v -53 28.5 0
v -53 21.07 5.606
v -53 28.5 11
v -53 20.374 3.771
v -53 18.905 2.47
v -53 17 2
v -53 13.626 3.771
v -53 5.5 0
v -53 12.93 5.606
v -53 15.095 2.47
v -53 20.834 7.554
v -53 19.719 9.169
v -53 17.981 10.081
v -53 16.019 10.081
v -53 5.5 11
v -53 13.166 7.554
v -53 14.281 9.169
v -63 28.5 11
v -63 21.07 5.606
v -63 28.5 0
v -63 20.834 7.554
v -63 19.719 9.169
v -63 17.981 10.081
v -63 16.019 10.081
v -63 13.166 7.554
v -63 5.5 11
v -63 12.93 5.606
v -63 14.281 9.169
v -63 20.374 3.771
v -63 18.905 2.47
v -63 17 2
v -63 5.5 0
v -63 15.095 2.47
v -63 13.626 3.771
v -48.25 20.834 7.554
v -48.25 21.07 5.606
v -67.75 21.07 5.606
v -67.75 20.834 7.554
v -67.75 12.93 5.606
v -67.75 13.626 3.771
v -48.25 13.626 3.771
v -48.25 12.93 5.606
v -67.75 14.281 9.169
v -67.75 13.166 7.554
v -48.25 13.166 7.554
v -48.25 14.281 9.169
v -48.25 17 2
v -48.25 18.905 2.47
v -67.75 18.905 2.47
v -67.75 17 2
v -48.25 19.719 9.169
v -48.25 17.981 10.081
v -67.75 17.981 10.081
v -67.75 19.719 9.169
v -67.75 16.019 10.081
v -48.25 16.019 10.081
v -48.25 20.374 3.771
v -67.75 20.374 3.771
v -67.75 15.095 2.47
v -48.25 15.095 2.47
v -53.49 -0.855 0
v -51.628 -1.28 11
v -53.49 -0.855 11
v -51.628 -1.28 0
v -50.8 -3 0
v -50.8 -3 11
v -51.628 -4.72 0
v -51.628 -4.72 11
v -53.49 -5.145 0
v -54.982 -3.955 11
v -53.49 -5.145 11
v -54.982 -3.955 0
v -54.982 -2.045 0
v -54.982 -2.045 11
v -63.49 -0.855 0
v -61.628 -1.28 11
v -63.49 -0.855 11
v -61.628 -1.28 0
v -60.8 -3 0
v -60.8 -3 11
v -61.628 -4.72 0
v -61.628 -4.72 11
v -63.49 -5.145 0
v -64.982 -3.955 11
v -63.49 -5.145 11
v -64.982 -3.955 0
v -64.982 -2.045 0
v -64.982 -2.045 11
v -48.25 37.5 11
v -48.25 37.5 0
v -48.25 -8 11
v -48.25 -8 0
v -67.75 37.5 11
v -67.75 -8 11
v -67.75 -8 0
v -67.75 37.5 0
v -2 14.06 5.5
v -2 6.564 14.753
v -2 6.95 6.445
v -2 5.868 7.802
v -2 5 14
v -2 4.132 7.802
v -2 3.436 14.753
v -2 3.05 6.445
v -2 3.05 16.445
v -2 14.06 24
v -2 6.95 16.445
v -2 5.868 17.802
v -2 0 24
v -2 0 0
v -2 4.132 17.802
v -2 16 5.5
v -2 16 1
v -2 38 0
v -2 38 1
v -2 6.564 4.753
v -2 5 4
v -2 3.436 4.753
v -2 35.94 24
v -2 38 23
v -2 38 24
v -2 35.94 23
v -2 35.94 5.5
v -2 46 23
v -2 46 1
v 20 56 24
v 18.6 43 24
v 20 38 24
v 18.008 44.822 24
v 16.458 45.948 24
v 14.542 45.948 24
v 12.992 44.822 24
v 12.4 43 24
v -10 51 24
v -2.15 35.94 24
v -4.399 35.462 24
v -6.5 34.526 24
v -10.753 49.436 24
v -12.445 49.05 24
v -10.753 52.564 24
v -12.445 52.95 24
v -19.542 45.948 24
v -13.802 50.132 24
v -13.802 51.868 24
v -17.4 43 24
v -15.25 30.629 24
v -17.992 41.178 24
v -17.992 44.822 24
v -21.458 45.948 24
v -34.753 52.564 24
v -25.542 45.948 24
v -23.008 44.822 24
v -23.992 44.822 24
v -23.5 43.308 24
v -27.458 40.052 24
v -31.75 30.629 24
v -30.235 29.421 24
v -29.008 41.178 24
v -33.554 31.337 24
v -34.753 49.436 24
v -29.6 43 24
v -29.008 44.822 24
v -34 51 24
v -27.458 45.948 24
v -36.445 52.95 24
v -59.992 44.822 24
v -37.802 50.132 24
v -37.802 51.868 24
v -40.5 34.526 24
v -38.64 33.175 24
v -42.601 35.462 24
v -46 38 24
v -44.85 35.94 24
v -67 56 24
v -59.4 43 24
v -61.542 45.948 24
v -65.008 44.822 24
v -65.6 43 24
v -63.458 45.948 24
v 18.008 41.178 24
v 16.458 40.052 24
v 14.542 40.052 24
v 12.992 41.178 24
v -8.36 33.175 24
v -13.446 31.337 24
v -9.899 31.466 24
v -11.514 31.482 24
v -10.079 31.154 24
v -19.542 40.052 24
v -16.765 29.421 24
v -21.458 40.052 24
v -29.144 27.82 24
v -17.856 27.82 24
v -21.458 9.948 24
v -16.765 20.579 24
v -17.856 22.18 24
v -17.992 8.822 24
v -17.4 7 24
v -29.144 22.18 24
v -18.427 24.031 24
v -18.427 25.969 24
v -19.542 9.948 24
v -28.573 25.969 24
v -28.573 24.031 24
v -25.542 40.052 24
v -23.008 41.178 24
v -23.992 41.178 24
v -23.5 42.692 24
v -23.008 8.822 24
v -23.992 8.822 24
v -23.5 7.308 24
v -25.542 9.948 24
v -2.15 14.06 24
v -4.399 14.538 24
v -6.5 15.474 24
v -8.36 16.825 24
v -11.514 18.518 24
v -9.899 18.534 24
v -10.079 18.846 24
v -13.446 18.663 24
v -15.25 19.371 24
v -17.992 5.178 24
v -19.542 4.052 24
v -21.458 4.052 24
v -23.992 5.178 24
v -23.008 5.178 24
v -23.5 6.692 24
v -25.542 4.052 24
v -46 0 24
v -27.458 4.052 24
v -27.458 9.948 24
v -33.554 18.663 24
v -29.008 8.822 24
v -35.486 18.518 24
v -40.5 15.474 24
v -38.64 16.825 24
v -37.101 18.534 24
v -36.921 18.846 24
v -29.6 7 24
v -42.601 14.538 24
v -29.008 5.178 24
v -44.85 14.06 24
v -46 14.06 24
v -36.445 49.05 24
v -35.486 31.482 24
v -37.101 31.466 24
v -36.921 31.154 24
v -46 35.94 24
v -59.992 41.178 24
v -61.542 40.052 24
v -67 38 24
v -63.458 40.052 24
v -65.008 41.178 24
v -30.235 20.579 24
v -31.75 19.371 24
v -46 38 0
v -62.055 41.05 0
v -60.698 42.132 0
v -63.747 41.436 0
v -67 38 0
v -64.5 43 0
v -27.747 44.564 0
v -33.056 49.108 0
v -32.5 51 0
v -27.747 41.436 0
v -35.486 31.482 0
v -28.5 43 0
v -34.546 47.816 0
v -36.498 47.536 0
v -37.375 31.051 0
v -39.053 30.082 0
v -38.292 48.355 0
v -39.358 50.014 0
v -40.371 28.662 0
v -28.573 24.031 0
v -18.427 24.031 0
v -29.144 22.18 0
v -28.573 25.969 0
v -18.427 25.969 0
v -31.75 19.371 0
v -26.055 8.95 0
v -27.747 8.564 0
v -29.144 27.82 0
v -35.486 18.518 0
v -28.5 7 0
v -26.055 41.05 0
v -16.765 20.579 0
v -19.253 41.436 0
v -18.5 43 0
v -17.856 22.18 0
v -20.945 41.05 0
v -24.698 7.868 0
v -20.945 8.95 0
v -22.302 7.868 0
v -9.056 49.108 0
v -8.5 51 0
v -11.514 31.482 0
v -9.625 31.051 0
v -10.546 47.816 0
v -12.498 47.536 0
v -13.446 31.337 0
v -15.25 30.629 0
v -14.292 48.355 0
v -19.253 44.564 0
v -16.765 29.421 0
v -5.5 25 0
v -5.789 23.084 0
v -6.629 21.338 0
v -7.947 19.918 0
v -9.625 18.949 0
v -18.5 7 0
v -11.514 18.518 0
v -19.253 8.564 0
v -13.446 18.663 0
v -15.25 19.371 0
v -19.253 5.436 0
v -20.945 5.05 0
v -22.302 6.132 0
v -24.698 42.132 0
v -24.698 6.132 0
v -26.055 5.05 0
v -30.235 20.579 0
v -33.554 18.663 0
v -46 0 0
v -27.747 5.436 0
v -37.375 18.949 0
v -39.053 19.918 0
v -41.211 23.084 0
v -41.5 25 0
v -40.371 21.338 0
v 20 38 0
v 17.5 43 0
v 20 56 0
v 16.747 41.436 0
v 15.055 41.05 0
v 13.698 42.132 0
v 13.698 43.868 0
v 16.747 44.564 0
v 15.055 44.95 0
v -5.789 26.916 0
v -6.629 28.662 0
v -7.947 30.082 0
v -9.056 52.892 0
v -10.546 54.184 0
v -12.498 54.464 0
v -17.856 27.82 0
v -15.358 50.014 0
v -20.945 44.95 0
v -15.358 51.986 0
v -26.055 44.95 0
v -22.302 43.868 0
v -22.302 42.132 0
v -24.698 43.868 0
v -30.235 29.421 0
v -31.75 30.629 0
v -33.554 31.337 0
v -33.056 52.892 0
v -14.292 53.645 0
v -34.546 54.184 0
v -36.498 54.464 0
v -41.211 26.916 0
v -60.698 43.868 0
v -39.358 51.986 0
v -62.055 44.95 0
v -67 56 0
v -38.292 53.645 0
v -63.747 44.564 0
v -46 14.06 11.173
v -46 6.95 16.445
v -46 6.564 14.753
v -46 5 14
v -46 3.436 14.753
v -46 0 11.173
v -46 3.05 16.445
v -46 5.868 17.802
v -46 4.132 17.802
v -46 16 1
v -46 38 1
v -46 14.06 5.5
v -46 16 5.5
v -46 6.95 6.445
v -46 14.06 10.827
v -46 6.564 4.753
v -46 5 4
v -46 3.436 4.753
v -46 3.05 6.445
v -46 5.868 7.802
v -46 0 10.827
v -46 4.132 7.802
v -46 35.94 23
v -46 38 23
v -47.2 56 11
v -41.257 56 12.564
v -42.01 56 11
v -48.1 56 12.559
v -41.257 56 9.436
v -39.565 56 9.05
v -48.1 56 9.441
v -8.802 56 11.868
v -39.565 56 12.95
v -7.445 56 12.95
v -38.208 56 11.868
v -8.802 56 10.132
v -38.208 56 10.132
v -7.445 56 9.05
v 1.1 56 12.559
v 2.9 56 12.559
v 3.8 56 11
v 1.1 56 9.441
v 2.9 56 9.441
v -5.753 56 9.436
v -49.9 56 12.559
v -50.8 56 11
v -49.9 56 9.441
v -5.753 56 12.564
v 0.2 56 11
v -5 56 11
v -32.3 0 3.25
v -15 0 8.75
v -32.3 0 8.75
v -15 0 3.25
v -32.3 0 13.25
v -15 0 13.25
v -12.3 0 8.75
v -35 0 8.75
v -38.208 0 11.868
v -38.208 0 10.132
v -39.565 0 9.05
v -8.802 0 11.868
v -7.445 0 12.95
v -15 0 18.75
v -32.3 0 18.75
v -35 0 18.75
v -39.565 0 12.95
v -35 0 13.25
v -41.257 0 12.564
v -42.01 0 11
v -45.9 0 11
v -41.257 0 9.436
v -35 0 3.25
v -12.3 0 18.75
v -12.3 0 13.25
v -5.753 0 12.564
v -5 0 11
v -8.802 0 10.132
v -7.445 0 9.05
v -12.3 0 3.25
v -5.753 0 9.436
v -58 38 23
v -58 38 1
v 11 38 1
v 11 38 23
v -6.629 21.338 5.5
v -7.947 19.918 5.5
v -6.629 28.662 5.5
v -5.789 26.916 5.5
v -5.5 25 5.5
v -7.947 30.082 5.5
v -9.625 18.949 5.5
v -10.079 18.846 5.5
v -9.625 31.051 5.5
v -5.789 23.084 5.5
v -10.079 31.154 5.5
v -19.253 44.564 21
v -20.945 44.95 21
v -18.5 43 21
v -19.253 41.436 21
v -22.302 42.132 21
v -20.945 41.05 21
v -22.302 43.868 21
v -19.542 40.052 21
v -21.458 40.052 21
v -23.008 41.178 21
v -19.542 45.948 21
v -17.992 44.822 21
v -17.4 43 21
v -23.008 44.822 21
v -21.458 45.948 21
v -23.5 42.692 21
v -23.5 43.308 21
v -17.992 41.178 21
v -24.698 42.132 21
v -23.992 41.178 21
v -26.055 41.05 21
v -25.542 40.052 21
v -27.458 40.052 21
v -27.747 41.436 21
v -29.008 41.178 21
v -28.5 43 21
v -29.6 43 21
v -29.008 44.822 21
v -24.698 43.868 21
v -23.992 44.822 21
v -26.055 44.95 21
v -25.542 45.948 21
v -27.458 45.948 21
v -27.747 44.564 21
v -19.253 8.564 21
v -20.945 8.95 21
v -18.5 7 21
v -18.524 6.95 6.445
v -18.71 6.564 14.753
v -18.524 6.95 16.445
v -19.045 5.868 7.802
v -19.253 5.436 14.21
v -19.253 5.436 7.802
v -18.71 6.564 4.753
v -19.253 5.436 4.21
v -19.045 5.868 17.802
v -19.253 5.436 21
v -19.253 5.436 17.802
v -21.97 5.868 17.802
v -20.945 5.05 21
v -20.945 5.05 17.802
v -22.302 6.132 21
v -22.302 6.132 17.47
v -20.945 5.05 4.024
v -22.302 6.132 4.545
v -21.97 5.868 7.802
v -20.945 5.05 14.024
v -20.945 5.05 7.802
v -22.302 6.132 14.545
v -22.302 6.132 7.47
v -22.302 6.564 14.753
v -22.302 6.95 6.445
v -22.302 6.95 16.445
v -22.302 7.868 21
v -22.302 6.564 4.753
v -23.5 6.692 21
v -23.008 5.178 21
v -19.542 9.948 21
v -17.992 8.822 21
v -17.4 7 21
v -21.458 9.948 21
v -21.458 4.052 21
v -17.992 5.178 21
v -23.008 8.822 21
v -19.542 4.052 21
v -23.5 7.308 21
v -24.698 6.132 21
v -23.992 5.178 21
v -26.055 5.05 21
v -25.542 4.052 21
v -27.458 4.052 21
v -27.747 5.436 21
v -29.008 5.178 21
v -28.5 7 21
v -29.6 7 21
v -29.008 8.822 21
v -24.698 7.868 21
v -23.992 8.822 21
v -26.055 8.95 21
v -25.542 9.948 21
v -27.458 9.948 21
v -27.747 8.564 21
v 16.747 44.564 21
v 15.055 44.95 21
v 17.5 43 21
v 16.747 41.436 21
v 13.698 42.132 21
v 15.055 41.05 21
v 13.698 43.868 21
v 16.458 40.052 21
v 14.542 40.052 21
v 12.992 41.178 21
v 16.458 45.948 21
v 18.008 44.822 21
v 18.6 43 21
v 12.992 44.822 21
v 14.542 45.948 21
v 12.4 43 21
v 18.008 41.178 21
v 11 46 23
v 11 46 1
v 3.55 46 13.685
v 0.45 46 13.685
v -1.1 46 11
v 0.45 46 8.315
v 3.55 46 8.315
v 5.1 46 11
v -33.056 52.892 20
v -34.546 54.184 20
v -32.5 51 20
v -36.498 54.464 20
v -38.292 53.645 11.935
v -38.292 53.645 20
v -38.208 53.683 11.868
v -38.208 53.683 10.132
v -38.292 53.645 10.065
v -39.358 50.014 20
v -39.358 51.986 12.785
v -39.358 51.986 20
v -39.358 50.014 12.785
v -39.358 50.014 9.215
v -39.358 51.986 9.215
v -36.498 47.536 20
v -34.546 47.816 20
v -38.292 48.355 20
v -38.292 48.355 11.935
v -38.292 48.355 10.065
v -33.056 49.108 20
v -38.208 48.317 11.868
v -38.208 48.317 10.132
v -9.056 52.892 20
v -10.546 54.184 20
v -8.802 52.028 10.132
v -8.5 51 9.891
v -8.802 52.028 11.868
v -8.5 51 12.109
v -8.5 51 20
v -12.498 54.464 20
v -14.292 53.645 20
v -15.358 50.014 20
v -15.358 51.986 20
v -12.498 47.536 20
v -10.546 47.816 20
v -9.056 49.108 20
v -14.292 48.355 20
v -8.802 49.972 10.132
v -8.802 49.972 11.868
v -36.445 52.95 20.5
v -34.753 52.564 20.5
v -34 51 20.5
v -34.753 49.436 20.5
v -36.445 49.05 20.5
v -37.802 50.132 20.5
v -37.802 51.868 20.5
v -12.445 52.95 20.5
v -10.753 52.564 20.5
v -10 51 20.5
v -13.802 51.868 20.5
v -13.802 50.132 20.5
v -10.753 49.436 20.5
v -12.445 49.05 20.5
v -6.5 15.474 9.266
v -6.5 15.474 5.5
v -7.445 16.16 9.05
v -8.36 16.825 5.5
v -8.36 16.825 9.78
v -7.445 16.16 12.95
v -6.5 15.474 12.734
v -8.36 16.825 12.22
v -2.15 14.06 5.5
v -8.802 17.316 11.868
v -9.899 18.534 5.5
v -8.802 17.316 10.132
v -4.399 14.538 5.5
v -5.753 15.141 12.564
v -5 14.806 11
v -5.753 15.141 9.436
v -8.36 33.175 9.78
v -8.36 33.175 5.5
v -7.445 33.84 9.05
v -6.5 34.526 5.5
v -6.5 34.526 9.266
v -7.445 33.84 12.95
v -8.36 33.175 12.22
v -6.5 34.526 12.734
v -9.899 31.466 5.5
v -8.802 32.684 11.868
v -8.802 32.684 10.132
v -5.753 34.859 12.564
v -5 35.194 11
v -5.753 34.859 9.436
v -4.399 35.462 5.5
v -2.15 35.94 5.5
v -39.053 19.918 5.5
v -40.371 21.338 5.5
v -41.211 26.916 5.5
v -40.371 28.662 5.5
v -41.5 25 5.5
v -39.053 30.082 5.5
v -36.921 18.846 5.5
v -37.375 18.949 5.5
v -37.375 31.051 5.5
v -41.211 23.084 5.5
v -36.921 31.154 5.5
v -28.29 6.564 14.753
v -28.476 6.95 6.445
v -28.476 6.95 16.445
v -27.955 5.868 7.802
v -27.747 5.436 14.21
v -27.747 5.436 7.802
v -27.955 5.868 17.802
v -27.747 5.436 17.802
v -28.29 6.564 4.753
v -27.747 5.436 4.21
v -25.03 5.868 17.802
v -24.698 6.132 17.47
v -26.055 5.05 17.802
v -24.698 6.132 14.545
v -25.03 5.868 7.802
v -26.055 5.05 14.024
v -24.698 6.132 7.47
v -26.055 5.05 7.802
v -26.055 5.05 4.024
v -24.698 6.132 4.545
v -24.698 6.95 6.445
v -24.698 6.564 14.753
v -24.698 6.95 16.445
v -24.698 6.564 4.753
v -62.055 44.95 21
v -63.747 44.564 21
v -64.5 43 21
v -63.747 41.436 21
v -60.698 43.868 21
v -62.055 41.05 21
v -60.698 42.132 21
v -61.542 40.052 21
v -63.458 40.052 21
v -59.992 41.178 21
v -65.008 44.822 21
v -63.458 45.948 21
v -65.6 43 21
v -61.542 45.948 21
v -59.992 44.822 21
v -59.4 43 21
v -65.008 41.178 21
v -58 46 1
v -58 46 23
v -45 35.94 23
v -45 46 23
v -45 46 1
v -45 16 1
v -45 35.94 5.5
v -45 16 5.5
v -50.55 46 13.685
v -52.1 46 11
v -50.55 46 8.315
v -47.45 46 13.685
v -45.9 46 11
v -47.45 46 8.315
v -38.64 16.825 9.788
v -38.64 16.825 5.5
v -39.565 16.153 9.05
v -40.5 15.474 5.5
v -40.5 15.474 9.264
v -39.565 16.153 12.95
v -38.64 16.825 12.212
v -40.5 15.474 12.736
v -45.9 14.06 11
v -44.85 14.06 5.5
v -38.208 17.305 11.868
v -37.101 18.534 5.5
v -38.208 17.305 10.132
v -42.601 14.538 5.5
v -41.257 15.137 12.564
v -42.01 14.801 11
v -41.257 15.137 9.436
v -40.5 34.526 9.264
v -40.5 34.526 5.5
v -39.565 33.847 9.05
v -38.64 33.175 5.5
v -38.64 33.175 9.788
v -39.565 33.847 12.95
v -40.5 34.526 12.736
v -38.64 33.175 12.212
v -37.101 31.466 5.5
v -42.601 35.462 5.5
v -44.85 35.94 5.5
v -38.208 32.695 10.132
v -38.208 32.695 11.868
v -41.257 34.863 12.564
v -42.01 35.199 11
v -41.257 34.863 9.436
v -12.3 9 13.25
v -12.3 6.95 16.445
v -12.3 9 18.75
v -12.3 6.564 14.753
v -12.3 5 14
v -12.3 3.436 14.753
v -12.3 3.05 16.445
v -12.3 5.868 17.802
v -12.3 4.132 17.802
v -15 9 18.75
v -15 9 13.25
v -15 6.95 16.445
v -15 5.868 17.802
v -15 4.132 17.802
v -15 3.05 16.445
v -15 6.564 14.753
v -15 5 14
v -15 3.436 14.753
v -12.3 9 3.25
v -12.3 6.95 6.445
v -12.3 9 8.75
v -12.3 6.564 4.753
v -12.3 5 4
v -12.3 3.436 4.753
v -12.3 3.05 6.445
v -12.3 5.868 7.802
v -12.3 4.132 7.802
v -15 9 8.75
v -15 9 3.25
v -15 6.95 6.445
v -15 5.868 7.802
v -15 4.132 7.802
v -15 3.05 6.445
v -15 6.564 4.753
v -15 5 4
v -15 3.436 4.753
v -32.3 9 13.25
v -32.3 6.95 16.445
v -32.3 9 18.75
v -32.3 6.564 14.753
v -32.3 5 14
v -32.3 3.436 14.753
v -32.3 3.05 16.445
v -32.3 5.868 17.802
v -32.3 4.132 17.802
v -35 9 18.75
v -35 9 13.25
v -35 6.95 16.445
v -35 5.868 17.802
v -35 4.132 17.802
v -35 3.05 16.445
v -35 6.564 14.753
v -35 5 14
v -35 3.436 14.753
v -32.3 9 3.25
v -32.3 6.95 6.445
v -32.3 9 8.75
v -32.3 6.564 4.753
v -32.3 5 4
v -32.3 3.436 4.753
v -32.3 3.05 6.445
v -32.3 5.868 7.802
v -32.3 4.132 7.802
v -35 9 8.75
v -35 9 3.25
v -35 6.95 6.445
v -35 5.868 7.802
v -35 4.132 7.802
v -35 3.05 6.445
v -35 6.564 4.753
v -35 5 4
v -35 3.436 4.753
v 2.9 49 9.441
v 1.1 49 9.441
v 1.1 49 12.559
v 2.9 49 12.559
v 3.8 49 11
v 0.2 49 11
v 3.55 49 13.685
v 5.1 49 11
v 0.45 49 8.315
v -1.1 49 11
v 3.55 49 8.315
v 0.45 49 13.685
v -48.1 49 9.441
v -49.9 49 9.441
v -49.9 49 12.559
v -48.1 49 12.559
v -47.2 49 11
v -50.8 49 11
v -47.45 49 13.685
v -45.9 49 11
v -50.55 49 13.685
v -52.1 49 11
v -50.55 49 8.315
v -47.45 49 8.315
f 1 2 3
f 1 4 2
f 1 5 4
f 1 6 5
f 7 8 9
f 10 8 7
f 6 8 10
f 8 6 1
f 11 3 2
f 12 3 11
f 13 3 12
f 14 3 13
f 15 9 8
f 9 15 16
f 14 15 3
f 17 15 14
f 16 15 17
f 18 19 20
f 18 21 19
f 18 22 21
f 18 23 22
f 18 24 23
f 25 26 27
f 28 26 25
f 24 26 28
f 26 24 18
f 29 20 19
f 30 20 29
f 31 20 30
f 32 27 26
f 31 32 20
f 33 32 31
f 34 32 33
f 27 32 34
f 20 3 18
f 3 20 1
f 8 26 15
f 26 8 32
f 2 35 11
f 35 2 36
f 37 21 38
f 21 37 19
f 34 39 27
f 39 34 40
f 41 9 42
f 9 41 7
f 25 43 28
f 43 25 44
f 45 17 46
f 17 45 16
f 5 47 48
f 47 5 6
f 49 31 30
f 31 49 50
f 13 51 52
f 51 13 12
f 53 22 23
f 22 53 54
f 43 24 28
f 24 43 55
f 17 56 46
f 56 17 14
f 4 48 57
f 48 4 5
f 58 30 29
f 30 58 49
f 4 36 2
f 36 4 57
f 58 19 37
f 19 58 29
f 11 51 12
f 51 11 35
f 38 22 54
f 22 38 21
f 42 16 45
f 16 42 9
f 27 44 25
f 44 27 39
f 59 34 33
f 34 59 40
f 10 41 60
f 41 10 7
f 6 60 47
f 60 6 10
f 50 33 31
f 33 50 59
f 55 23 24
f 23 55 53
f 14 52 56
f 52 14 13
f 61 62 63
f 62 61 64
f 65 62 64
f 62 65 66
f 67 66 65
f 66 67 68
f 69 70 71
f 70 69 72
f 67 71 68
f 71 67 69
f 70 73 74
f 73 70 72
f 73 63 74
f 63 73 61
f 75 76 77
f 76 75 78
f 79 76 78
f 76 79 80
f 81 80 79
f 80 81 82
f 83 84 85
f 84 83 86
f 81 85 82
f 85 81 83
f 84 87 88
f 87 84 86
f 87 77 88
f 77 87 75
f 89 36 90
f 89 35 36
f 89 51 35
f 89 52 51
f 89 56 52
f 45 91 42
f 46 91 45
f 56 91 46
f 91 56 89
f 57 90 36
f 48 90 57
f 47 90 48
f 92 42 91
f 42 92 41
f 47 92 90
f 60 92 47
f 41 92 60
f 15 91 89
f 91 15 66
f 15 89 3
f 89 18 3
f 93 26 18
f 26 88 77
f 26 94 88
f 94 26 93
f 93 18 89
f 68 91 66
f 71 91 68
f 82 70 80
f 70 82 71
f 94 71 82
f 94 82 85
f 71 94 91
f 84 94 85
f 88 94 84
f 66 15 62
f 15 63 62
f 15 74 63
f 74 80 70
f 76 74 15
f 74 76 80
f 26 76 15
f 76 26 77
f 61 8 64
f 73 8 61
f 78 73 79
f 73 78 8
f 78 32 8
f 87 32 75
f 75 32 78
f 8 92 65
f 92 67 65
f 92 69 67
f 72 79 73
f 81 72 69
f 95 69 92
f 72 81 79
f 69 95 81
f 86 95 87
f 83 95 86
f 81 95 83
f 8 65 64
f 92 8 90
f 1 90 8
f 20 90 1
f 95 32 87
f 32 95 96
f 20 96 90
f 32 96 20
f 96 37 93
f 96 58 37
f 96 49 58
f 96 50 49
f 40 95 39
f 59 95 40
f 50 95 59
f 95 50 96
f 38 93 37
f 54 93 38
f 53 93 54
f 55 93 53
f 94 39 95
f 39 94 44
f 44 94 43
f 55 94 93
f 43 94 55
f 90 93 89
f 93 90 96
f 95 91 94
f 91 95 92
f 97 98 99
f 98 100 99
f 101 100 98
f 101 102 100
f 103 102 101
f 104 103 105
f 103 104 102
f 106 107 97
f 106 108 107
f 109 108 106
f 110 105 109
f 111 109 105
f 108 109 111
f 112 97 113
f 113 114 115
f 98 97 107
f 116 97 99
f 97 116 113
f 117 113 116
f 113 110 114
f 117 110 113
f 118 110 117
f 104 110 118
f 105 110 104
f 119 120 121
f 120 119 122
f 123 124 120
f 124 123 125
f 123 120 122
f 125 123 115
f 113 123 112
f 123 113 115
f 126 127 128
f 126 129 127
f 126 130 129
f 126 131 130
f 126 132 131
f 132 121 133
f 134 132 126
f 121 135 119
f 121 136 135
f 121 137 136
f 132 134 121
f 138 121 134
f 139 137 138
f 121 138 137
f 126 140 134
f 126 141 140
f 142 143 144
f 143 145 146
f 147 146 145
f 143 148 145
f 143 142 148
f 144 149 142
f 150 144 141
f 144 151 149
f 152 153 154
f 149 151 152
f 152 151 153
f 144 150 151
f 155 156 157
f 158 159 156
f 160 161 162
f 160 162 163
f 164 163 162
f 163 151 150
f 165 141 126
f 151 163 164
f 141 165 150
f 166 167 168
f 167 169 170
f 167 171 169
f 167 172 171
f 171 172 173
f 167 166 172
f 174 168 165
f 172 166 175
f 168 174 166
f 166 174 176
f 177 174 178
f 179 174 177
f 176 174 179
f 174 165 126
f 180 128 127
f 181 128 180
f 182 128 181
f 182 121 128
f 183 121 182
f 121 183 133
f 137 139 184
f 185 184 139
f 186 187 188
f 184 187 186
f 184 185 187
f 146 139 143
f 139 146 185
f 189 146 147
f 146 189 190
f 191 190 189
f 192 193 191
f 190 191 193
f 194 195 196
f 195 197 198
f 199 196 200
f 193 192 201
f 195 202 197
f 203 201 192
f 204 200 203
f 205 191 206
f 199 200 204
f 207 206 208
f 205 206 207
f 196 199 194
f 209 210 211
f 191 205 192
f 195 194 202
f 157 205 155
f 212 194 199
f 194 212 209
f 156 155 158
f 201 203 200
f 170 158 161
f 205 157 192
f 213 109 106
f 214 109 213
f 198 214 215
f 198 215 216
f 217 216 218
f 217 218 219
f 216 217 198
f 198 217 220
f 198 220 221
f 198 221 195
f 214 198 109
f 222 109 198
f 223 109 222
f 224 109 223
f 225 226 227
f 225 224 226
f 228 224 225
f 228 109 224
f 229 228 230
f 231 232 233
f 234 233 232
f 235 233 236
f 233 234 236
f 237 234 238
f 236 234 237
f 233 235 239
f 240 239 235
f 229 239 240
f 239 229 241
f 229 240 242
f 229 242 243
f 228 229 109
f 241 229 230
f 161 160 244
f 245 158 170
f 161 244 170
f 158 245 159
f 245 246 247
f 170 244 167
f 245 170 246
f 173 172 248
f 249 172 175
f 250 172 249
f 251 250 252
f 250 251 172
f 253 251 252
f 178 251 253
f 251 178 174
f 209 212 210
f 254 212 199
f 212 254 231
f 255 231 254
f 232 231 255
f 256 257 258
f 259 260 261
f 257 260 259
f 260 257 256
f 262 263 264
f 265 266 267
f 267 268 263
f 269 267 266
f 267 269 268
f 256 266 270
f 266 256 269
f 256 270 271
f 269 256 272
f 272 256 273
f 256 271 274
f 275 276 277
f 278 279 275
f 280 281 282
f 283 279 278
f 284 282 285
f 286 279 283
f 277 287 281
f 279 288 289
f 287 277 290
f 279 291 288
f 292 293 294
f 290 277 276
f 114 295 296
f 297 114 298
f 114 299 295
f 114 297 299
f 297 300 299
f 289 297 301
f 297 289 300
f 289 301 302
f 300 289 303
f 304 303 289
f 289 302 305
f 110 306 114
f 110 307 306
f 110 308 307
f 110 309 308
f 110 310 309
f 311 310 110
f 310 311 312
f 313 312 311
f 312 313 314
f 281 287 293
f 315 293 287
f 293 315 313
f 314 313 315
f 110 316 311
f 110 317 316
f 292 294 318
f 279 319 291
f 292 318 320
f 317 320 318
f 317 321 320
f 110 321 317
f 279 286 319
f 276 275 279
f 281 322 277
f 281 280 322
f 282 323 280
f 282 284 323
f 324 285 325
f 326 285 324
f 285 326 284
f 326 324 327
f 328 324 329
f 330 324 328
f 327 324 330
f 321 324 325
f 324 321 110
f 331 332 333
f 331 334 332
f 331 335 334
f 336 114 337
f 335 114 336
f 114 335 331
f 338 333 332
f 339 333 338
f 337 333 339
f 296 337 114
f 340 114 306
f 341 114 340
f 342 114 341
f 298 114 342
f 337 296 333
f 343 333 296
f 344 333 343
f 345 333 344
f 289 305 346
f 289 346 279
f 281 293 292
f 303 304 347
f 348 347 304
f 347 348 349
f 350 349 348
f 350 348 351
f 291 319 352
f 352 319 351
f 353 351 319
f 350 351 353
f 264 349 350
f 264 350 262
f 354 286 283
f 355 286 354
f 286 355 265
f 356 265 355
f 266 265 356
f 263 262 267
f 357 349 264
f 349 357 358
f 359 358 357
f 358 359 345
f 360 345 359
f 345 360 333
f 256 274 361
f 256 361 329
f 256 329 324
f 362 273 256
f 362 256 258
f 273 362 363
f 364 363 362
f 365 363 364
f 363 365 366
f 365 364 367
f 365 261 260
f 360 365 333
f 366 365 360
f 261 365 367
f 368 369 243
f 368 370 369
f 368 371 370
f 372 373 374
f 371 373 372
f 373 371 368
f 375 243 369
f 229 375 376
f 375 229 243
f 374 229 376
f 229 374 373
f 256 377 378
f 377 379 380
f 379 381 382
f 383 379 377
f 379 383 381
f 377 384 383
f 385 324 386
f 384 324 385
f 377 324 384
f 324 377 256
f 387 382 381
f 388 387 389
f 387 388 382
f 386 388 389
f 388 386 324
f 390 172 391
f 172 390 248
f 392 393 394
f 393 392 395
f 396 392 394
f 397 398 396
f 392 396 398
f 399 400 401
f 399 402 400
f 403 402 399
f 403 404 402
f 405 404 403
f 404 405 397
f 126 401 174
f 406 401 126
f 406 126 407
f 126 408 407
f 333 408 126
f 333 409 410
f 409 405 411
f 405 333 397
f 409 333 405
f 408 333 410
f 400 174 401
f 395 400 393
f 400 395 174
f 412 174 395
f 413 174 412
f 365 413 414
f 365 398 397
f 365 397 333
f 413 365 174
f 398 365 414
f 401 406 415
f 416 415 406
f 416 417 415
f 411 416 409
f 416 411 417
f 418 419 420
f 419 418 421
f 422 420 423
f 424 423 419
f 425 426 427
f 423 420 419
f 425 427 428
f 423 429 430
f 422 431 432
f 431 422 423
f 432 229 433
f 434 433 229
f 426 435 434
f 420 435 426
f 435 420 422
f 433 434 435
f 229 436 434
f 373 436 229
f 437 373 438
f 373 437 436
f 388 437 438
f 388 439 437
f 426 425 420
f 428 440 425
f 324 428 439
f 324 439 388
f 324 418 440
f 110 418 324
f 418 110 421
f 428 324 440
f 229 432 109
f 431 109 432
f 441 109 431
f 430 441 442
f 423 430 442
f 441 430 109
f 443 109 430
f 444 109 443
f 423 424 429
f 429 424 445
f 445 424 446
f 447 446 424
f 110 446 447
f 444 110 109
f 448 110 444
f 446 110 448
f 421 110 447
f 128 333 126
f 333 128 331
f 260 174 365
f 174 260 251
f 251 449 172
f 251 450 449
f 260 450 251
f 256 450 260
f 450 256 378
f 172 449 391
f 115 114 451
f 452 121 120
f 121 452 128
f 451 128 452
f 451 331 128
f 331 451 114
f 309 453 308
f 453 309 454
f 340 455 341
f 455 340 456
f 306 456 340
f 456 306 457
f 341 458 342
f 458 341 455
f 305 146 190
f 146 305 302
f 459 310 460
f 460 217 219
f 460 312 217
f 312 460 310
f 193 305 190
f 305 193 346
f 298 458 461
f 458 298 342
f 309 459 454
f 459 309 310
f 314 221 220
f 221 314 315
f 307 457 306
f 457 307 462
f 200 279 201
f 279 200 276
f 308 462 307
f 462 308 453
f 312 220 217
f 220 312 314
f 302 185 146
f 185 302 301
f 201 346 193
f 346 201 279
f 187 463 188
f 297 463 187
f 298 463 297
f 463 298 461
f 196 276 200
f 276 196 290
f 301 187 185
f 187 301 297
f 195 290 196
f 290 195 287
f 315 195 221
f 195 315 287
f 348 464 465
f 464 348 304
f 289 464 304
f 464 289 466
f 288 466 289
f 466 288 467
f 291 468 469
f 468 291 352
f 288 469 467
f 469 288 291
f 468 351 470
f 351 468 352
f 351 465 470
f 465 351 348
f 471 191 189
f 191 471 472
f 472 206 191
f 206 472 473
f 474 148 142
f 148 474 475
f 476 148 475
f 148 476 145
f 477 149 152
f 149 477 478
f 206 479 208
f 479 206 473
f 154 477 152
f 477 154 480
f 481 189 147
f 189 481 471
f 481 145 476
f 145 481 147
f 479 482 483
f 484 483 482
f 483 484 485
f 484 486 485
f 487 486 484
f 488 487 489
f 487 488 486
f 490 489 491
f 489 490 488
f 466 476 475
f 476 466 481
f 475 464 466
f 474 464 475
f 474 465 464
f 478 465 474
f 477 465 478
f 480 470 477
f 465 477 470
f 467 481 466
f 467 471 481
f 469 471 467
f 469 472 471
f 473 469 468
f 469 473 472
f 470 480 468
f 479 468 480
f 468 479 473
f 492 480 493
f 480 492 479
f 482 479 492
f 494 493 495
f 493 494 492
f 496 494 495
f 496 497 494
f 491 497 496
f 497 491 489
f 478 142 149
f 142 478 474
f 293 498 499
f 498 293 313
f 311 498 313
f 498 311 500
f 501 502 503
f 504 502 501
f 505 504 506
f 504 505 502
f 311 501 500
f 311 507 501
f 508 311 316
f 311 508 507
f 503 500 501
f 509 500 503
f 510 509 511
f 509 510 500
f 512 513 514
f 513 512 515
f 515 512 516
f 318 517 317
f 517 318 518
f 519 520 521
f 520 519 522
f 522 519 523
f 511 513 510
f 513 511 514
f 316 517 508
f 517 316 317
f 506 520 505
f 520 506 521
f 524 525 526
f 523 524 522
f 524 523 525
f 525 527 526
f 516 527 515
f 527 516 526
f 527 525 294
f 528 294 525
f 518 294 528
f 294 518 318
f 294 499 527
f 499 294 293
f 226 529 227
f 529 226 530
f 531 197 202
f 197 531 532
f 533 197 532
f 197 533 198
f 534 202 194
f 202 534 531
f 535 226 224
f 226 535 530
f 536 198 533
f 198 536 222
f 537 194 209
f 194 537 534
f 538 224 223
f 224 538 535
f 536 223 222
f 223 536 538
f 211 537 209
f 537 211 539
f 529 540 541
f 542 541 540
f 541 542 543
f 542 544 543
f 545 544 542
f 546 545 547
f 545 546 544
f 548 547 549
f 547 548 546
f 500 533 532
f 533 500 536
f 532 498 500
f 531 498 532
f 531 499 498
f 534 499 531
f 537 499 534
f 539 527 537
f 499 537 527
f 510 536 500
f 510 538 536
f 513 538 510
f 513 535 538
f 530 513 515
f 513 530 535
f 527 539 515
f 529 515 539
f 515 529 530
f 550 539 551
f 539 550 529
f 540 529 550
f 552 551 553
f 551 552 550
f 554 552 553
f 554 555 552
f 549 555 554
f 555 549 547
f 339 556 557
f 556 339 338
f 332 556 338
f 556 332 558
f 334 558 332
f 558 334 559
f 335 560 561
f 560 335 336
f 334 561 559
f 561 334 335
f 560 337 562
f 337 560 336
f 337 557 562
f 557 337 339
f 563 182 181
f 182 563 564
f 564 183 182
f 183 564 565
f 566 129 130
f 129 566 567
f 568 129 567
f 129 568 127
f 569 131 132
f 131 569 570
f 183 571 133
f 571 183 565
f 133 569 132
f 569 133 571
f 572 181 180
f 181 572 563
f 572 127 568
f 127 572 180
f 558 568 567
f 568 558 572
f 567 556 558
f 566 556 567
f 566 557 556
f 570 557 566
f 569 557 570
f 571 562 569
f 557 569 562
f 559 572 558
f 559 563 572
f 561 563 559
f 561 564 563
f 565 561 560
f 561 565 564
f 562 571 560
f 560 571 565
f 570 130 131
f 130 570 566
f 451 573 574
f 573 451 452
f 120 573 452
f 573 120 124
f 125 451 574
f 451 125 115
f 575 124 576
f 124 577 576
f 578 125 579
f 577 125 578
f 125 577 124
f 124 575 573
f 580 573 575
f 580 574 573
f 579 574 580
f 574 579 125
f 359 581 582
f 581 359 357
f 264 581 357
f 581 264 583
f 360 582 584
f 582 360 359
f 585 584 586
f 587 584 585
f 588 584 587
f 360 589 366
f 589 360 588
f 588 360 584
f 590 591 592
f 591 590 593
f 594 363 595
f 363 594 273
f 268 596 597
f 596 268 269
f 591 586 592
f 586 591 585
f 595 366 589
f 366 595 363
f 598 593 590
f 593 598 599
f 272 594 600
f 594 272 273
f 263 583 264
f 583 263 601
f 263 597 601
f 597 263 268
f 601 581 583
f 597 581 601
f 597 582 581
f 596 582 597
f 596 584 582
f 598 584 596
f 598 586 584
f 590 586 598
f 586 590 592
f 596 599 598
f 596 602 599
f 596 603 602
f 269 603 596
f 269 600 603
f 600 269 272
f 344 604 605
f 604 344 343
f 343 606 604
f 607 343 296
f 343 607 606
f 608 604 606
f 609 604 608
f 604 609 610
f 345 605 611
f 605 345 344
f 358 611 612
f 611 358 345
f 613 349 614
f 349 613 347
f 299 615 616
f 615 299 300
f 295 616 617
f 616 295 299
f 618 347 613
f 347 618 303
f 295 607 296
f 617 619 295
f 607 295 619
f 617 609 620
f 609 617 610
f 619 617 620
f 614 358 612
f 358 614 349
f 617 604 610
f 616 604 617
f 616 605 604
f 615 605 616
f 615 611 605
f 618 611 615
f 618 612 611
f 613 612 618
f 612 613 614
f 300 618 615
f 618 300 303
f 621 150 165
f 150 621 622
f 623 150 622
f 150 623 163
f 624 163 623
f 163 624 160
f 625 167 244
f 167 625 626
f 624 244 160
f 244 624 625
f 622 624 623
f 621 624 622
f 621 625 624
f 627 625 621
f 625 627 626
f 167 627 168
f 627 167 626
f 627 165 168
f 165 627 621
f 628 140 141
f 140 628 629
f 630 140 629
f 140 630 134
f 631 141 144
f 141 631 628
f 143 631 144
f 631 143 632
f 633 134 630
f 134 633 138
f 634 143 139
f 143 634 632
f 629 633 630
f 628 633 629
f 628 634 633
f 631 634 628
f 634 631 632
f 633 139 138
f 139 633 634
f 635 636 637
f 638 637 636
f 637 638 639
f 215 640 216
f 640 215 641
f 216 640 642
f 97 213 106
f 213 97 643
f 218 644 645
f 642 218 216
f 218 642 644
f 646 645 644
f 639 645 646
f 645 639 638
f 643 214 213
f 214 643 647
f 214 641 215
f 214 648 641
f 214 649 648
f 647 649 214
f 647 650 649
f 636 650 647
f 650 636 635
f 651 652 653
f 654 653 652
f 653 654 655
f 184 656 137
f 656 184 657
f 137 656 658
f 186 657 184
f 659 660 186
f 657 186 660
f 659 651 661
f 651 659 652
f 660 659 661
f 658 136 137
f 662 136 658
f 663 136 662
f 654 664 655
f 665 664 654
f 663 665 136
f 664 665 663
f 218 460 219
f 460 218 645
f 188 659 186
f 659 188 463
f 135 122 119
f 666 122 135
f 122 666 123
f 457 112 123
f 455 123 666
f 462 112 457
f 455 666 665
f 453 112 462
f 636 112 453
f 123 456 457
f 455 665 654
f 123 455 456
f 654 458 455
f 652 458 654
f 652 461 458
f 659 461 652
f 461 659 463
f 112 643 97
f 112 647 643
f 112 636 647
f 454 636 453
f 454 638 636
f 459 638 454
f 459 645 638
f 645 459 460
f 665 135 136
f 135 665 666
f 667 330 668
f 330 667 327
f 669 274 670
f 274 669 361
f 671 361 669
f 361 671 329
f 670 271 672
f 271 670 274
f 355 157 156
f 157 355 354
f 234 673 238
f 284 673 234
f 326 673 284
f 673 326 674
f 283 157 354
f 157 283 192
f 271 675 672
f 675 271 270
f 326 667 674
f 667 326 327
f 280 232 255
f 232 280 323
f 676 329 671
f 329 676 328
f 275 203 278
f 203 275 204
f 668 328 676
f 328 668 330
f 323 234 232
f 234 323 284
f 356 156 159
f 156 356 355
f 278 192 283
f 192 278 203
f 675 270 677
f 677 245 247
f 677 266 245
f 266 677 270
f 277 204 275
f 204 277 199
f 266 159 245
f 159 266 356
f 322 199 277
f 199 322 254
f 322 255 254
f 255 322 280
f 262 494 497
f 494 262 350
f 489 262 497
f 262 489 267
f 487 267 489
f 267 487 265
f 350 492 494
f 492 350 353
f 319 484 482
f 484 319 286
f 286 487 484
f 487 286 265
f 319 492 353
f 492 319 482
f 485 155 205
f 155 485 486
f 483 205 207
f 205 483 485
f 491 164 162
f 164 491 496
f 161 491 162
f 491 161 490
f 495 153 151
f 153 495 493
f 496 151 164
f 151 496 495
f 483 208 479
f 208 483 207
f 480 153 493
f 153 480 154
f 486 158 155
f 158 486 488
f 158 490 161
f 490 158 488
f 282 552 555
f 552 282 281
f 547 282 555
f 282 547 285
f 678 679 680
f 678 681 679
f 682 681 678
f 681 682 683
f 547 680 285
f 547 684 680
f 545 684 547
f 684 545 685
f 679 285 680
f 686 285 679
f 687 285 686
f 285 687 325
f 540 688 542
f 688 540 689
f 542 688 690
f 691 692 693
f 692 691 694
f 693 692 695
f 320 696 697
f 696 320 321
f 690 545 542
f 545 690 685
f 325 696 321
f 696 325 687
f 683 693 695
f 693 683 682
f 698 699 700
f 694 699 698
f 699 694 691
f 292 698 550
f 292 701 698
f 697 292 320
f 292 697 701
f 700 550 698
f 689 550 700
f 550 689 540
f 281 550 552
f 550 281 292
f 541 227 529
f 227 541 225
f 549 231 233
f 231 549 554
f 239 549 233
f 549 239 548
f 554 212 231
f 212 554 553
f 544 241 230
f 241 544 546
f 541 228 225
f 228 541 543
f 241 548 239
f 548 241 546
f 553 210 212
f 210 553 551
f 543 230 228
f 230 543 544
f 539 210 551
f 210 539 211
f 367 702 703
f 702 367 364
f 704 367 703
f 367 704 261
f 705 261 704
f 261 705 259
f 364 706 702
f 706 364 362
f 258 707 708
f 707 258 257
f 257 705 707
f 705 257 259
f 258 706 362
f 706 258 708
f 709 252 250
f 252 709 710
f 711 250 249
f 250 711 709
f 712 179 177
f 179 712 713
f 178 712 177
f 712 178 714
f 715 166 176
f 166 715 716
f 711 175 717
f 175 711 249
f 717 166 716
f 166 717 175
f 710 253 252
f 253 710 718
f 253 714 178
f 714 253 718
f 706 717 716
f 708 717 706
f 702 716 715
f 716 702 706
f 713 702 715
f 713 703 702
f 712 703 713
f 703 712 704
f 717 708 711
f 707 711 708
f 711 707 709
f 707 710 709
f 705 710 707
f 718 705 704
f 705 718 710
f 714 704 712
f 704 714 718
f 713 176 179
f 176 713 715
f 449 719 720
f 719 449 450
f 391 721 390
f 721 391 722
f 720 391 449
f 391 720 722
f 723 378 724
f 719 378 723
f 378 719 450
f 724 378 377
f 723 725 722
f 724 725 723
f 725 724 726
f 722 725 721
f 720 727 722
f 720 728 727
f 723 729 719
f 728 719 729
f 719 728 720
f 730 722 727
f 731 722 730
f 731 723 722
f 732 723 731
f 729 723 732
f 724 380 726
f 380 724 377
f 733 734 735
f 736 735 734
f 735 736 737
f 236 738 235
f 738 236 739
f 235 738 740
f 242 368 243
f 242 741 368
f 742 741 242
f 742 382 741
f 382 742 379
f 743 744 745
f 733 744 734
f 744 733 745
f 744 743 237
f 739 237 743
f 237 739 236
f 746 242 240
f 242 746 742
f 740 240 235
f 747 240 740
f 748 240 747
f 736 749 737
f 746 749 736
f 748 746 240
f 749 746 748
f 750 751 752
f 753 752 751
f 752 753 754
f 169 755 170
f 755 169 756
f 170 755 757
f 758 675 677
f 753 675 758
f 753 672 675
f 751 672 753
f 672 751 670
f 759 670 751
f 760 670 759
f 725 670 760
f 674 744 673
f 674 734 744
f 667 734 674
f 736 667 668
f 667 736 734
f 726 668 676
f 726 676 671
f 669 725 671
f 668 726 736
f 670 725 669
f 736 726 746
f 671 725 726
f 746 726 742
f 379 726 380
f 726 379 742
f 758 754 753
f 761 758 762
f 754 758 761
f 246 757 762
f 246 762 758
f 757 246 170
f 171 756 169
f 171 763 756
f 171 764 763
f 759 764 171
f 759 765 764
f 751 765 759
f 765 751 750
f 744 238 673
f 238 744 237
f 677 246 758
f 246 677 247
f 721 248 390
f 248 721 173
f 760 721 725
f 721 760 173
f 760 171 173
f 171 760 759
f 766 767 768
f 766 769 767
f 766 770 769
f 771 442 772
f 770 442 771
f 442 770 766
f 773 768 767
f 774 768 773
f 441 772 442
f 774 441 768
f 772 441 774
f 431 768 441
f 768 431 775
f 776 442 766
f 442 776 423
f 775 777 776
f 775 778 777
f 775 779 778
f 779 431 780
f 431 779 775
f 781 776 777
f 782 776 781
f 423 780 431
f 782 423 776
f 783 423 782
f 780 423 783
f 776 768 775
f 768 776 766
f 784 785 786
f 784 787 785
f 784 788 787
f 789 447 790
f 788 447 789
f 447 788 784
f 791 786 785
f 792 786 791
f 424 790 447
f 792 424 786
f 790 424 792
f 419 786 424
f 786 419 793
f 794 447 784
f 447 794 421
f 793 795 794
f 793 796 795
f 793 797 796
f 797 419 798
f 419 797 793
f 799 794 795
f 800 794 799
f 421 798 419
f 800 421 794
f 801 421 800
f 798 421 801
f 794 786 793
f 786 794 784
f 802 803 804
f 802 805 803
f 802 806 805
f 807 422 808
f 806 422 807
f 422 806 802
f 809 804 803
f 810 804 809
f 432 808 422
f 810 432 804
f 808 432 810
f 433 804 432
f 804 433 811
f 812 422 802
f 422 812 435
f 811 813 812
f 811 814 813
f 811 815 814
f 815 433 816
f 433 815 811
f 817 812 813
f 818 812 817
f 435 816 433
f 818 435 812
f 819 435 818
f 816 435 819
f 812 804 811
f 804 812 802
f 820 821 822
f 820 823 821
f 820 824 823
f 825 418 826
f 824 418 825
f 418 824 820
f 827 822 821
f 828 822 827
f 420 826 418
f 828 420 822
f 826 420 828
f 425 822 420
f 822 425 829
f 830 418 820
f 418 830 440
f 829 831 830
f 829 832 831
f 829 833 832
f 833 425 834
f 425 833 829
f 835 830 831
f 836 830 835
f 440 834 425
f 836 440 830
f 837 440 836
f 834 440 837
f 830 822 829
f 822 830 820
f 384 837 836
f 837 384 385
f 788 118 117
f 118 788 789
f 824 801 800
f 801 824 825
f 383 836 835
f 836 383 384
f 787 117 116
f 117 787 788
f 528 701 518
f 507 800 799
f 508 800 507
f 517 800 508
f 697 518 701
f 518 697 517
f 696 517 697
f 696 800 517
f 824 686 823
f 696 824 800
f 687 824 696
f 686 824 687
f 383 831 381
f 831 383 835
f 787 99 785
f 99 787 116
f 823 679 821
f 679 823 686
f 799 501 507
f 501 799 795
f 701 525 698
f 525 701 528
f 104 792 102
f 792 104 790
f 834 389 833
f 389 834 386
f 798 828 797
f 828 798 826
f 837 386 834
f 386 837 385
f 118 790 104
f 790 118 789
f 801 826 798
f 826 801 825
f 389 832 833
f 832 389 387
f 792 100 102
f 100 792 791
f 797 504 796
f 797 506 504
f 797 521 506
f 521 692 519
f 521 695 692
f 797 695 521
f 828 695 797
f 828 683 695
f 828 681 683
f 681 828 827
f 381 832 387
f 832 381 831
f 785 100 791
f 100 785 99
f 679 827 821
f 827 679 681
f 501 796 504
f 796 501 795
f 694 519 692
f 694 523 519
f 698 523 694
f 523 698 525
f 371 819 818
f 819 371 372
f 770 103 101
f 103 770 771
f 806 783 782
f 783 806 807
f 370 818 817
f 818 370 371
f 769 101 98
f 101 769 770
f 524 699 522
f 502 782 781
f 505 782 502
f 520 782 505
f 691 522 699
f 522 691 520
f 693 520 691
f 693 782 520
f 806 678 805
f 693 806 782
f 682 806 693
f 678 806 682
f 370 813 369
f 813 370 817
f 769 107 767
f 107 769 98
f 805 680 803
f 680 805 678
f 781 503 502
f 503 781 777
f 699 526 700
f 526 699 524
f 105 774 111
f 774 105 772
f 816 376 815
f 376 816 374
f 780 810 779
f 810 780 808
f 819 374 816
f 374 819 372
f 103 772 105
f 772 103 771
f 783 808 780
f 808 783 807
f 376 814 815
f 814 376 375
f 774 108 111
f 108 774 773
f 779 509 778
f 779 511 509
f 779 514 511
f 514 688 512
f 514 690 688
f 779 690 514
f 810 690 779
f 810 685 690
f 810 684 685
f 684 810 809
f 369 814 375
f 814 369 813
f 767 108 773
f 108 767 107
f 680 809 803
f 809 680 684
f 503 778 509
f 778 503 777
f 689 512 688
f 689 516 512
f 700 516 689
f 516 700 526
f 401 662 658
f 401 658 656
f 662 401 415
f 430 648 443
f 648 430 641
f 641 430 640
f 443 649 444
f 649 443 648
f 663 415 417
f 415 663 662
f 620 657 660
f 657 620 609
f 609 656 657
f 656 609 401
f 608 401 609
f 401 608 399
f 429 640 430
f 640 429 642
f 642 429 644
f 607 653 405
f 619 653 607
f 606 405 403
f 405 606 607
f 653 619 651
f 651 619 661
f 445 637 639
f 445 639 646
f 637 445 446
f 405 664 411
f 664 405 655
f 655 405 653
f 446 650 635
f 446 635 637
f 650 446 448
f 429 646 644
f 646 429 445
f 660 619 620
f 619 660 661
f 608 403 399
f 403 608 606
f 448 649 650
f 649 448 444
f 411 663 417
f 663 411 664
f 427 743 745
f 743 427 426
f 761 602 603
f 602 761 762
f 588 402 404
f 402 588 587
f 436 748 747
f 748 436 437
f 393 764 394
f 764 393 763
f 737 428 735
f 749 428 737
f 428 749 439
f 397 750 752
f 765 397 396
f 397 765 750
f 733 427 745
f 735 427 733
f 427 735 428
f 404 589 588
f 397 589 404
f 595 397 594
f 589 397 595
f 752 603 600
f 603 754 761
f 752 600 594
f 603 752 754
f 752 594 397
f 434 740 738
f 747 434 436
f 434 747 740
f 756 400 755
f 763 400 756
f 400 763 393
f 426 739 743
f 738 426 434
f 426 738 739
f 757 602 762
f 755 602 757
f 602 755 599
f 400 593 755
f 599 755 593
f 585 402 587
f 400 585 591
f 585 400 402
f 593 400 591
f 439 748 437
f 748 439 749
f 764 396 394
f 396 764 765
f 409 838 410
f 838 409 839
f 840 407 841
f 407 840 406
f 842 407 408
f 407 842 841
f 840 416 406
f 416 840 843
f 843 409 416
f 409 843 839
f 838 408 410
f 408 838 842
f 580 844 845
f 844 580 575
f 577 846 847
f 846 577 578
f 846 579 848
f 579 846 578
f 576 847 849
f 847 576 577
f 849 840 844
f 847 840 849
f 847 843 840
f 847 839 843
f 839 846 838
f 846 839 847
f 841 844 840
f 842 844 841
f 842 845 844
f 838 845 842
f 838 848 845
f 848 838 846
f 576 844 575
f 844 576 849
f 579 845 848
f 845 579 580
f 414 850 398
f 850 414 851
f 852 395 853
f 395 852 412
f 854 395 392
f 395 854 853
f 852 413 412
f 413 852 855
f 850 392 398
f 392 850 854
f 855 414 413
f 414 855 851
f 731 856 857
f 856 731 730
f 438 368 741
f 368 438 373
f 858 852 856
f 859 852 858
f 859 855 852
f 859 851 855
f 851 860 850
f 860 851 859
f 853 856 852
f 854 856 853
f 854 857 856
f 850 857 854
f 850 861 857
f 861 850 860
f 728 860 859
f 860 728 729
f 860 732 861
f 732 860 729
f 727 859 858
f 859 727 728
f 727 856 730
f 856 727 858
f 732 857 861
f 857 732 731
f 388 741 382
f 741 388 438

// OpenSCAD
// PRUSA iteration3
// Compact extruder
// GNU GPL v3
// Josef Průša <iam@josefprusa.cz> and contributors
// http://www.reprap.org/wiki/Prusa_Mendel
// http://prusamendel.org




module motor_dummy(){
	translate([-22,-22,-5]) %cube([44,44,5]);
	translate([18,18,-5]) %cylinder(r=2, h=24);
	translate([18,-18,-5]) %cylinder(r=2, h=24);
	translate([-18,18,-5]) %cylinder(r=2, h=24);
	translate([-18,-18,-5]) %cylinder(r=2, h=24);
	translate([-22+2.5+10,0,-5]) %cylinder(r=2.5, h=7);
	
}

module extruder_base(){
 // Main body
 translate([-1-22,-2,0]) cube([22+22,56,24]);
 // Extruder plate mount
 translate([-16-28,49-5-8,0]) cube([59+28,18,24]);
 // Carriage mount cylinders
 translate([11,25,0]){
  //translate([-12,24,0]) cylinder(r=5, h=24);
  //translate([12,24,0]) cylinder(r=5, h=24);
 }
}

module extruder_holes(){
 // 1st extruder
 translate([11,25,0]){ // Translate to center of the main block
  // Main shaft opening
  translate([0,-2,-1]) cylinder(r=6.5, h=26);

  // Lower motor mount hole
  translate([-8.5,18-2,-1]) cylinder(r=2, h=35);
  translate([-8.5,18-2,21]) cylinder(r=3.1, h=35);
  // Upper motor mount hole
  translate([-8.5,-18-2,-1]) cylinder(r=2, h=35);
  translate([-8.5,-18-2,21]) cylinder(r=3.1, h=35);
  // Idler motor mount hole
  translate([-8.5+36,18-2,-1]) cylinder(r=2, h=35);
  translate([-8.5+36,18-2,21]) cylinder(r=3.1, h=35);

  //Idler place
  
  translate([10,-11,1]) cube([13,30,22]);

  // Carriage mount right screw head hole
  translate([-12-12,24,-3]) cylinder(r=3.5, h=23);
  // Carriage mount left screw head hole
  translate([12-12,24,-3]) cylinder(r=3.5, h=23);
  // Carriage mount right screw hole
  translate([-12-12,24,20.5]) cylinder(r=2, h=23);
  // Carriage mount left screw head hole
  translate([12-12,24,20.5]) cylinder(r=2, h=23);
  // Idler bearing cutout
  translate([11,0-2,-4.5+10]) cylinder(r=11, h=20);
 }

 // Filament path
 translate([1.5+11+3.5,65,11]) rotate([90,0,0]) cylinder(r=2, h=70);

 mirror([1,0,0])translate([1.5+11+3.51+1,65,11]) rotate([90,0,0]) cylinder(r=2, h=70);

 // 2nd extruder
 translate([-1,0,0]) mirror([1,0,0]) translate([11,25,0]){ // Translate to center of the main block
  // Main shaft opening
  translate([0,-2,-1]) cylinder(r=6.5, h=26);

  // Lower motor mount hole
  translate([-8.5,18-2,-1]) cylinder(r=2, h=35);
  translate([-8.5,18-2,21]) cylinder(r=3.1, h=35);
  // Upper motor mount hole
  translate([-8.5,-18-2,-1]) cylinder(r=2, h=35);
  translate([-8.5,-18-2,21]) cylinder(r=3.1, h=35);
  // Idler motor mount hole
  translate([-8.5+36,18-2,-1]) cylinder(r=2, h=35);
  translate([-8.5+36,18-2,21]) cylinder(r=3.1, h=35);

  translate([10,-11,1]) cube([13,30,22]);
  
  // Idler bearing cutout
  translate([11,0-2,-4.5+10]) cylinder(r=11, h=20);
 }
 

 // Left extruder plate mounting hole
 translate([25,65,11]) rotate([90,0,0]) cylinder(r=1.8, h=70);
 translate([25,47,11]) rotate([90,0,0]) cylinder(r=3.1, h=70, $fn=6);
 // Right extruder plate mounting hole

 translate([-26,65,11]) rotate([90,0,0]) cylinder(r=1.8, h=70);
 translate([-26,47,11]) rotate([90,0,0]) cylinder(r=3.1, h=70, $fn=6);

  // Idler mounting holse
  translate([11,25,10]){
   // Nut traps
   translate([-3,-32,6-5.5/2]) cube([2.7,14,5.5]);
   translate([-3,-32,-4-5.5/2]) cube([2.7,14,5.5]);

   translate([-3-20,-32,6-5.5/2]) cube([2.7,14,5.5]);
   translate([-3-20,-32,-4-5.5/2]) cube([2.7,14,5.5]);
   // Screws
   translate([-50,-22,-4]) rotate([0,90,0]) cylinder(r=2, h=80);
   translate([-50,-22,6]) rotate([0,90,0]) cylinder(r=2, h=80);
	}
}

module extruder_idler_base(){
 translate([0.25,0,0]) cube([19.5,45.5,8+3]);
	
}

module extruder_idler_holes(){
 translate([10,25,0]){
  // Main cutout
  cube([10,23,25], center= true);
  // Idler shaft
  translate([-12,0,4.1+2])rotate([0,90,0])cylinder(r=4.1, h=24);
  // Screw holes
  translate([5,-20,-1])cylinder(r=2.2, h=24);
  translate([-5,-20,-1])cylinder(r=2.2, h=24);
 }
}


// Idler final part
module idler(){
 difference(){
  extruder_idler_base();
  extruder_idler_holes();
 }
}

//translate([10,0,1]) rotate([0,-90,0]) idler();
translate([-68,-8,0])  idler();
// Extruder final part
module extruder(){
 translate([-23,2,0])difference(){
  extruder_base();
  extruder_holes();
 }
}

extruder();
translate([-2.5,25,0]) motor_dummy();
